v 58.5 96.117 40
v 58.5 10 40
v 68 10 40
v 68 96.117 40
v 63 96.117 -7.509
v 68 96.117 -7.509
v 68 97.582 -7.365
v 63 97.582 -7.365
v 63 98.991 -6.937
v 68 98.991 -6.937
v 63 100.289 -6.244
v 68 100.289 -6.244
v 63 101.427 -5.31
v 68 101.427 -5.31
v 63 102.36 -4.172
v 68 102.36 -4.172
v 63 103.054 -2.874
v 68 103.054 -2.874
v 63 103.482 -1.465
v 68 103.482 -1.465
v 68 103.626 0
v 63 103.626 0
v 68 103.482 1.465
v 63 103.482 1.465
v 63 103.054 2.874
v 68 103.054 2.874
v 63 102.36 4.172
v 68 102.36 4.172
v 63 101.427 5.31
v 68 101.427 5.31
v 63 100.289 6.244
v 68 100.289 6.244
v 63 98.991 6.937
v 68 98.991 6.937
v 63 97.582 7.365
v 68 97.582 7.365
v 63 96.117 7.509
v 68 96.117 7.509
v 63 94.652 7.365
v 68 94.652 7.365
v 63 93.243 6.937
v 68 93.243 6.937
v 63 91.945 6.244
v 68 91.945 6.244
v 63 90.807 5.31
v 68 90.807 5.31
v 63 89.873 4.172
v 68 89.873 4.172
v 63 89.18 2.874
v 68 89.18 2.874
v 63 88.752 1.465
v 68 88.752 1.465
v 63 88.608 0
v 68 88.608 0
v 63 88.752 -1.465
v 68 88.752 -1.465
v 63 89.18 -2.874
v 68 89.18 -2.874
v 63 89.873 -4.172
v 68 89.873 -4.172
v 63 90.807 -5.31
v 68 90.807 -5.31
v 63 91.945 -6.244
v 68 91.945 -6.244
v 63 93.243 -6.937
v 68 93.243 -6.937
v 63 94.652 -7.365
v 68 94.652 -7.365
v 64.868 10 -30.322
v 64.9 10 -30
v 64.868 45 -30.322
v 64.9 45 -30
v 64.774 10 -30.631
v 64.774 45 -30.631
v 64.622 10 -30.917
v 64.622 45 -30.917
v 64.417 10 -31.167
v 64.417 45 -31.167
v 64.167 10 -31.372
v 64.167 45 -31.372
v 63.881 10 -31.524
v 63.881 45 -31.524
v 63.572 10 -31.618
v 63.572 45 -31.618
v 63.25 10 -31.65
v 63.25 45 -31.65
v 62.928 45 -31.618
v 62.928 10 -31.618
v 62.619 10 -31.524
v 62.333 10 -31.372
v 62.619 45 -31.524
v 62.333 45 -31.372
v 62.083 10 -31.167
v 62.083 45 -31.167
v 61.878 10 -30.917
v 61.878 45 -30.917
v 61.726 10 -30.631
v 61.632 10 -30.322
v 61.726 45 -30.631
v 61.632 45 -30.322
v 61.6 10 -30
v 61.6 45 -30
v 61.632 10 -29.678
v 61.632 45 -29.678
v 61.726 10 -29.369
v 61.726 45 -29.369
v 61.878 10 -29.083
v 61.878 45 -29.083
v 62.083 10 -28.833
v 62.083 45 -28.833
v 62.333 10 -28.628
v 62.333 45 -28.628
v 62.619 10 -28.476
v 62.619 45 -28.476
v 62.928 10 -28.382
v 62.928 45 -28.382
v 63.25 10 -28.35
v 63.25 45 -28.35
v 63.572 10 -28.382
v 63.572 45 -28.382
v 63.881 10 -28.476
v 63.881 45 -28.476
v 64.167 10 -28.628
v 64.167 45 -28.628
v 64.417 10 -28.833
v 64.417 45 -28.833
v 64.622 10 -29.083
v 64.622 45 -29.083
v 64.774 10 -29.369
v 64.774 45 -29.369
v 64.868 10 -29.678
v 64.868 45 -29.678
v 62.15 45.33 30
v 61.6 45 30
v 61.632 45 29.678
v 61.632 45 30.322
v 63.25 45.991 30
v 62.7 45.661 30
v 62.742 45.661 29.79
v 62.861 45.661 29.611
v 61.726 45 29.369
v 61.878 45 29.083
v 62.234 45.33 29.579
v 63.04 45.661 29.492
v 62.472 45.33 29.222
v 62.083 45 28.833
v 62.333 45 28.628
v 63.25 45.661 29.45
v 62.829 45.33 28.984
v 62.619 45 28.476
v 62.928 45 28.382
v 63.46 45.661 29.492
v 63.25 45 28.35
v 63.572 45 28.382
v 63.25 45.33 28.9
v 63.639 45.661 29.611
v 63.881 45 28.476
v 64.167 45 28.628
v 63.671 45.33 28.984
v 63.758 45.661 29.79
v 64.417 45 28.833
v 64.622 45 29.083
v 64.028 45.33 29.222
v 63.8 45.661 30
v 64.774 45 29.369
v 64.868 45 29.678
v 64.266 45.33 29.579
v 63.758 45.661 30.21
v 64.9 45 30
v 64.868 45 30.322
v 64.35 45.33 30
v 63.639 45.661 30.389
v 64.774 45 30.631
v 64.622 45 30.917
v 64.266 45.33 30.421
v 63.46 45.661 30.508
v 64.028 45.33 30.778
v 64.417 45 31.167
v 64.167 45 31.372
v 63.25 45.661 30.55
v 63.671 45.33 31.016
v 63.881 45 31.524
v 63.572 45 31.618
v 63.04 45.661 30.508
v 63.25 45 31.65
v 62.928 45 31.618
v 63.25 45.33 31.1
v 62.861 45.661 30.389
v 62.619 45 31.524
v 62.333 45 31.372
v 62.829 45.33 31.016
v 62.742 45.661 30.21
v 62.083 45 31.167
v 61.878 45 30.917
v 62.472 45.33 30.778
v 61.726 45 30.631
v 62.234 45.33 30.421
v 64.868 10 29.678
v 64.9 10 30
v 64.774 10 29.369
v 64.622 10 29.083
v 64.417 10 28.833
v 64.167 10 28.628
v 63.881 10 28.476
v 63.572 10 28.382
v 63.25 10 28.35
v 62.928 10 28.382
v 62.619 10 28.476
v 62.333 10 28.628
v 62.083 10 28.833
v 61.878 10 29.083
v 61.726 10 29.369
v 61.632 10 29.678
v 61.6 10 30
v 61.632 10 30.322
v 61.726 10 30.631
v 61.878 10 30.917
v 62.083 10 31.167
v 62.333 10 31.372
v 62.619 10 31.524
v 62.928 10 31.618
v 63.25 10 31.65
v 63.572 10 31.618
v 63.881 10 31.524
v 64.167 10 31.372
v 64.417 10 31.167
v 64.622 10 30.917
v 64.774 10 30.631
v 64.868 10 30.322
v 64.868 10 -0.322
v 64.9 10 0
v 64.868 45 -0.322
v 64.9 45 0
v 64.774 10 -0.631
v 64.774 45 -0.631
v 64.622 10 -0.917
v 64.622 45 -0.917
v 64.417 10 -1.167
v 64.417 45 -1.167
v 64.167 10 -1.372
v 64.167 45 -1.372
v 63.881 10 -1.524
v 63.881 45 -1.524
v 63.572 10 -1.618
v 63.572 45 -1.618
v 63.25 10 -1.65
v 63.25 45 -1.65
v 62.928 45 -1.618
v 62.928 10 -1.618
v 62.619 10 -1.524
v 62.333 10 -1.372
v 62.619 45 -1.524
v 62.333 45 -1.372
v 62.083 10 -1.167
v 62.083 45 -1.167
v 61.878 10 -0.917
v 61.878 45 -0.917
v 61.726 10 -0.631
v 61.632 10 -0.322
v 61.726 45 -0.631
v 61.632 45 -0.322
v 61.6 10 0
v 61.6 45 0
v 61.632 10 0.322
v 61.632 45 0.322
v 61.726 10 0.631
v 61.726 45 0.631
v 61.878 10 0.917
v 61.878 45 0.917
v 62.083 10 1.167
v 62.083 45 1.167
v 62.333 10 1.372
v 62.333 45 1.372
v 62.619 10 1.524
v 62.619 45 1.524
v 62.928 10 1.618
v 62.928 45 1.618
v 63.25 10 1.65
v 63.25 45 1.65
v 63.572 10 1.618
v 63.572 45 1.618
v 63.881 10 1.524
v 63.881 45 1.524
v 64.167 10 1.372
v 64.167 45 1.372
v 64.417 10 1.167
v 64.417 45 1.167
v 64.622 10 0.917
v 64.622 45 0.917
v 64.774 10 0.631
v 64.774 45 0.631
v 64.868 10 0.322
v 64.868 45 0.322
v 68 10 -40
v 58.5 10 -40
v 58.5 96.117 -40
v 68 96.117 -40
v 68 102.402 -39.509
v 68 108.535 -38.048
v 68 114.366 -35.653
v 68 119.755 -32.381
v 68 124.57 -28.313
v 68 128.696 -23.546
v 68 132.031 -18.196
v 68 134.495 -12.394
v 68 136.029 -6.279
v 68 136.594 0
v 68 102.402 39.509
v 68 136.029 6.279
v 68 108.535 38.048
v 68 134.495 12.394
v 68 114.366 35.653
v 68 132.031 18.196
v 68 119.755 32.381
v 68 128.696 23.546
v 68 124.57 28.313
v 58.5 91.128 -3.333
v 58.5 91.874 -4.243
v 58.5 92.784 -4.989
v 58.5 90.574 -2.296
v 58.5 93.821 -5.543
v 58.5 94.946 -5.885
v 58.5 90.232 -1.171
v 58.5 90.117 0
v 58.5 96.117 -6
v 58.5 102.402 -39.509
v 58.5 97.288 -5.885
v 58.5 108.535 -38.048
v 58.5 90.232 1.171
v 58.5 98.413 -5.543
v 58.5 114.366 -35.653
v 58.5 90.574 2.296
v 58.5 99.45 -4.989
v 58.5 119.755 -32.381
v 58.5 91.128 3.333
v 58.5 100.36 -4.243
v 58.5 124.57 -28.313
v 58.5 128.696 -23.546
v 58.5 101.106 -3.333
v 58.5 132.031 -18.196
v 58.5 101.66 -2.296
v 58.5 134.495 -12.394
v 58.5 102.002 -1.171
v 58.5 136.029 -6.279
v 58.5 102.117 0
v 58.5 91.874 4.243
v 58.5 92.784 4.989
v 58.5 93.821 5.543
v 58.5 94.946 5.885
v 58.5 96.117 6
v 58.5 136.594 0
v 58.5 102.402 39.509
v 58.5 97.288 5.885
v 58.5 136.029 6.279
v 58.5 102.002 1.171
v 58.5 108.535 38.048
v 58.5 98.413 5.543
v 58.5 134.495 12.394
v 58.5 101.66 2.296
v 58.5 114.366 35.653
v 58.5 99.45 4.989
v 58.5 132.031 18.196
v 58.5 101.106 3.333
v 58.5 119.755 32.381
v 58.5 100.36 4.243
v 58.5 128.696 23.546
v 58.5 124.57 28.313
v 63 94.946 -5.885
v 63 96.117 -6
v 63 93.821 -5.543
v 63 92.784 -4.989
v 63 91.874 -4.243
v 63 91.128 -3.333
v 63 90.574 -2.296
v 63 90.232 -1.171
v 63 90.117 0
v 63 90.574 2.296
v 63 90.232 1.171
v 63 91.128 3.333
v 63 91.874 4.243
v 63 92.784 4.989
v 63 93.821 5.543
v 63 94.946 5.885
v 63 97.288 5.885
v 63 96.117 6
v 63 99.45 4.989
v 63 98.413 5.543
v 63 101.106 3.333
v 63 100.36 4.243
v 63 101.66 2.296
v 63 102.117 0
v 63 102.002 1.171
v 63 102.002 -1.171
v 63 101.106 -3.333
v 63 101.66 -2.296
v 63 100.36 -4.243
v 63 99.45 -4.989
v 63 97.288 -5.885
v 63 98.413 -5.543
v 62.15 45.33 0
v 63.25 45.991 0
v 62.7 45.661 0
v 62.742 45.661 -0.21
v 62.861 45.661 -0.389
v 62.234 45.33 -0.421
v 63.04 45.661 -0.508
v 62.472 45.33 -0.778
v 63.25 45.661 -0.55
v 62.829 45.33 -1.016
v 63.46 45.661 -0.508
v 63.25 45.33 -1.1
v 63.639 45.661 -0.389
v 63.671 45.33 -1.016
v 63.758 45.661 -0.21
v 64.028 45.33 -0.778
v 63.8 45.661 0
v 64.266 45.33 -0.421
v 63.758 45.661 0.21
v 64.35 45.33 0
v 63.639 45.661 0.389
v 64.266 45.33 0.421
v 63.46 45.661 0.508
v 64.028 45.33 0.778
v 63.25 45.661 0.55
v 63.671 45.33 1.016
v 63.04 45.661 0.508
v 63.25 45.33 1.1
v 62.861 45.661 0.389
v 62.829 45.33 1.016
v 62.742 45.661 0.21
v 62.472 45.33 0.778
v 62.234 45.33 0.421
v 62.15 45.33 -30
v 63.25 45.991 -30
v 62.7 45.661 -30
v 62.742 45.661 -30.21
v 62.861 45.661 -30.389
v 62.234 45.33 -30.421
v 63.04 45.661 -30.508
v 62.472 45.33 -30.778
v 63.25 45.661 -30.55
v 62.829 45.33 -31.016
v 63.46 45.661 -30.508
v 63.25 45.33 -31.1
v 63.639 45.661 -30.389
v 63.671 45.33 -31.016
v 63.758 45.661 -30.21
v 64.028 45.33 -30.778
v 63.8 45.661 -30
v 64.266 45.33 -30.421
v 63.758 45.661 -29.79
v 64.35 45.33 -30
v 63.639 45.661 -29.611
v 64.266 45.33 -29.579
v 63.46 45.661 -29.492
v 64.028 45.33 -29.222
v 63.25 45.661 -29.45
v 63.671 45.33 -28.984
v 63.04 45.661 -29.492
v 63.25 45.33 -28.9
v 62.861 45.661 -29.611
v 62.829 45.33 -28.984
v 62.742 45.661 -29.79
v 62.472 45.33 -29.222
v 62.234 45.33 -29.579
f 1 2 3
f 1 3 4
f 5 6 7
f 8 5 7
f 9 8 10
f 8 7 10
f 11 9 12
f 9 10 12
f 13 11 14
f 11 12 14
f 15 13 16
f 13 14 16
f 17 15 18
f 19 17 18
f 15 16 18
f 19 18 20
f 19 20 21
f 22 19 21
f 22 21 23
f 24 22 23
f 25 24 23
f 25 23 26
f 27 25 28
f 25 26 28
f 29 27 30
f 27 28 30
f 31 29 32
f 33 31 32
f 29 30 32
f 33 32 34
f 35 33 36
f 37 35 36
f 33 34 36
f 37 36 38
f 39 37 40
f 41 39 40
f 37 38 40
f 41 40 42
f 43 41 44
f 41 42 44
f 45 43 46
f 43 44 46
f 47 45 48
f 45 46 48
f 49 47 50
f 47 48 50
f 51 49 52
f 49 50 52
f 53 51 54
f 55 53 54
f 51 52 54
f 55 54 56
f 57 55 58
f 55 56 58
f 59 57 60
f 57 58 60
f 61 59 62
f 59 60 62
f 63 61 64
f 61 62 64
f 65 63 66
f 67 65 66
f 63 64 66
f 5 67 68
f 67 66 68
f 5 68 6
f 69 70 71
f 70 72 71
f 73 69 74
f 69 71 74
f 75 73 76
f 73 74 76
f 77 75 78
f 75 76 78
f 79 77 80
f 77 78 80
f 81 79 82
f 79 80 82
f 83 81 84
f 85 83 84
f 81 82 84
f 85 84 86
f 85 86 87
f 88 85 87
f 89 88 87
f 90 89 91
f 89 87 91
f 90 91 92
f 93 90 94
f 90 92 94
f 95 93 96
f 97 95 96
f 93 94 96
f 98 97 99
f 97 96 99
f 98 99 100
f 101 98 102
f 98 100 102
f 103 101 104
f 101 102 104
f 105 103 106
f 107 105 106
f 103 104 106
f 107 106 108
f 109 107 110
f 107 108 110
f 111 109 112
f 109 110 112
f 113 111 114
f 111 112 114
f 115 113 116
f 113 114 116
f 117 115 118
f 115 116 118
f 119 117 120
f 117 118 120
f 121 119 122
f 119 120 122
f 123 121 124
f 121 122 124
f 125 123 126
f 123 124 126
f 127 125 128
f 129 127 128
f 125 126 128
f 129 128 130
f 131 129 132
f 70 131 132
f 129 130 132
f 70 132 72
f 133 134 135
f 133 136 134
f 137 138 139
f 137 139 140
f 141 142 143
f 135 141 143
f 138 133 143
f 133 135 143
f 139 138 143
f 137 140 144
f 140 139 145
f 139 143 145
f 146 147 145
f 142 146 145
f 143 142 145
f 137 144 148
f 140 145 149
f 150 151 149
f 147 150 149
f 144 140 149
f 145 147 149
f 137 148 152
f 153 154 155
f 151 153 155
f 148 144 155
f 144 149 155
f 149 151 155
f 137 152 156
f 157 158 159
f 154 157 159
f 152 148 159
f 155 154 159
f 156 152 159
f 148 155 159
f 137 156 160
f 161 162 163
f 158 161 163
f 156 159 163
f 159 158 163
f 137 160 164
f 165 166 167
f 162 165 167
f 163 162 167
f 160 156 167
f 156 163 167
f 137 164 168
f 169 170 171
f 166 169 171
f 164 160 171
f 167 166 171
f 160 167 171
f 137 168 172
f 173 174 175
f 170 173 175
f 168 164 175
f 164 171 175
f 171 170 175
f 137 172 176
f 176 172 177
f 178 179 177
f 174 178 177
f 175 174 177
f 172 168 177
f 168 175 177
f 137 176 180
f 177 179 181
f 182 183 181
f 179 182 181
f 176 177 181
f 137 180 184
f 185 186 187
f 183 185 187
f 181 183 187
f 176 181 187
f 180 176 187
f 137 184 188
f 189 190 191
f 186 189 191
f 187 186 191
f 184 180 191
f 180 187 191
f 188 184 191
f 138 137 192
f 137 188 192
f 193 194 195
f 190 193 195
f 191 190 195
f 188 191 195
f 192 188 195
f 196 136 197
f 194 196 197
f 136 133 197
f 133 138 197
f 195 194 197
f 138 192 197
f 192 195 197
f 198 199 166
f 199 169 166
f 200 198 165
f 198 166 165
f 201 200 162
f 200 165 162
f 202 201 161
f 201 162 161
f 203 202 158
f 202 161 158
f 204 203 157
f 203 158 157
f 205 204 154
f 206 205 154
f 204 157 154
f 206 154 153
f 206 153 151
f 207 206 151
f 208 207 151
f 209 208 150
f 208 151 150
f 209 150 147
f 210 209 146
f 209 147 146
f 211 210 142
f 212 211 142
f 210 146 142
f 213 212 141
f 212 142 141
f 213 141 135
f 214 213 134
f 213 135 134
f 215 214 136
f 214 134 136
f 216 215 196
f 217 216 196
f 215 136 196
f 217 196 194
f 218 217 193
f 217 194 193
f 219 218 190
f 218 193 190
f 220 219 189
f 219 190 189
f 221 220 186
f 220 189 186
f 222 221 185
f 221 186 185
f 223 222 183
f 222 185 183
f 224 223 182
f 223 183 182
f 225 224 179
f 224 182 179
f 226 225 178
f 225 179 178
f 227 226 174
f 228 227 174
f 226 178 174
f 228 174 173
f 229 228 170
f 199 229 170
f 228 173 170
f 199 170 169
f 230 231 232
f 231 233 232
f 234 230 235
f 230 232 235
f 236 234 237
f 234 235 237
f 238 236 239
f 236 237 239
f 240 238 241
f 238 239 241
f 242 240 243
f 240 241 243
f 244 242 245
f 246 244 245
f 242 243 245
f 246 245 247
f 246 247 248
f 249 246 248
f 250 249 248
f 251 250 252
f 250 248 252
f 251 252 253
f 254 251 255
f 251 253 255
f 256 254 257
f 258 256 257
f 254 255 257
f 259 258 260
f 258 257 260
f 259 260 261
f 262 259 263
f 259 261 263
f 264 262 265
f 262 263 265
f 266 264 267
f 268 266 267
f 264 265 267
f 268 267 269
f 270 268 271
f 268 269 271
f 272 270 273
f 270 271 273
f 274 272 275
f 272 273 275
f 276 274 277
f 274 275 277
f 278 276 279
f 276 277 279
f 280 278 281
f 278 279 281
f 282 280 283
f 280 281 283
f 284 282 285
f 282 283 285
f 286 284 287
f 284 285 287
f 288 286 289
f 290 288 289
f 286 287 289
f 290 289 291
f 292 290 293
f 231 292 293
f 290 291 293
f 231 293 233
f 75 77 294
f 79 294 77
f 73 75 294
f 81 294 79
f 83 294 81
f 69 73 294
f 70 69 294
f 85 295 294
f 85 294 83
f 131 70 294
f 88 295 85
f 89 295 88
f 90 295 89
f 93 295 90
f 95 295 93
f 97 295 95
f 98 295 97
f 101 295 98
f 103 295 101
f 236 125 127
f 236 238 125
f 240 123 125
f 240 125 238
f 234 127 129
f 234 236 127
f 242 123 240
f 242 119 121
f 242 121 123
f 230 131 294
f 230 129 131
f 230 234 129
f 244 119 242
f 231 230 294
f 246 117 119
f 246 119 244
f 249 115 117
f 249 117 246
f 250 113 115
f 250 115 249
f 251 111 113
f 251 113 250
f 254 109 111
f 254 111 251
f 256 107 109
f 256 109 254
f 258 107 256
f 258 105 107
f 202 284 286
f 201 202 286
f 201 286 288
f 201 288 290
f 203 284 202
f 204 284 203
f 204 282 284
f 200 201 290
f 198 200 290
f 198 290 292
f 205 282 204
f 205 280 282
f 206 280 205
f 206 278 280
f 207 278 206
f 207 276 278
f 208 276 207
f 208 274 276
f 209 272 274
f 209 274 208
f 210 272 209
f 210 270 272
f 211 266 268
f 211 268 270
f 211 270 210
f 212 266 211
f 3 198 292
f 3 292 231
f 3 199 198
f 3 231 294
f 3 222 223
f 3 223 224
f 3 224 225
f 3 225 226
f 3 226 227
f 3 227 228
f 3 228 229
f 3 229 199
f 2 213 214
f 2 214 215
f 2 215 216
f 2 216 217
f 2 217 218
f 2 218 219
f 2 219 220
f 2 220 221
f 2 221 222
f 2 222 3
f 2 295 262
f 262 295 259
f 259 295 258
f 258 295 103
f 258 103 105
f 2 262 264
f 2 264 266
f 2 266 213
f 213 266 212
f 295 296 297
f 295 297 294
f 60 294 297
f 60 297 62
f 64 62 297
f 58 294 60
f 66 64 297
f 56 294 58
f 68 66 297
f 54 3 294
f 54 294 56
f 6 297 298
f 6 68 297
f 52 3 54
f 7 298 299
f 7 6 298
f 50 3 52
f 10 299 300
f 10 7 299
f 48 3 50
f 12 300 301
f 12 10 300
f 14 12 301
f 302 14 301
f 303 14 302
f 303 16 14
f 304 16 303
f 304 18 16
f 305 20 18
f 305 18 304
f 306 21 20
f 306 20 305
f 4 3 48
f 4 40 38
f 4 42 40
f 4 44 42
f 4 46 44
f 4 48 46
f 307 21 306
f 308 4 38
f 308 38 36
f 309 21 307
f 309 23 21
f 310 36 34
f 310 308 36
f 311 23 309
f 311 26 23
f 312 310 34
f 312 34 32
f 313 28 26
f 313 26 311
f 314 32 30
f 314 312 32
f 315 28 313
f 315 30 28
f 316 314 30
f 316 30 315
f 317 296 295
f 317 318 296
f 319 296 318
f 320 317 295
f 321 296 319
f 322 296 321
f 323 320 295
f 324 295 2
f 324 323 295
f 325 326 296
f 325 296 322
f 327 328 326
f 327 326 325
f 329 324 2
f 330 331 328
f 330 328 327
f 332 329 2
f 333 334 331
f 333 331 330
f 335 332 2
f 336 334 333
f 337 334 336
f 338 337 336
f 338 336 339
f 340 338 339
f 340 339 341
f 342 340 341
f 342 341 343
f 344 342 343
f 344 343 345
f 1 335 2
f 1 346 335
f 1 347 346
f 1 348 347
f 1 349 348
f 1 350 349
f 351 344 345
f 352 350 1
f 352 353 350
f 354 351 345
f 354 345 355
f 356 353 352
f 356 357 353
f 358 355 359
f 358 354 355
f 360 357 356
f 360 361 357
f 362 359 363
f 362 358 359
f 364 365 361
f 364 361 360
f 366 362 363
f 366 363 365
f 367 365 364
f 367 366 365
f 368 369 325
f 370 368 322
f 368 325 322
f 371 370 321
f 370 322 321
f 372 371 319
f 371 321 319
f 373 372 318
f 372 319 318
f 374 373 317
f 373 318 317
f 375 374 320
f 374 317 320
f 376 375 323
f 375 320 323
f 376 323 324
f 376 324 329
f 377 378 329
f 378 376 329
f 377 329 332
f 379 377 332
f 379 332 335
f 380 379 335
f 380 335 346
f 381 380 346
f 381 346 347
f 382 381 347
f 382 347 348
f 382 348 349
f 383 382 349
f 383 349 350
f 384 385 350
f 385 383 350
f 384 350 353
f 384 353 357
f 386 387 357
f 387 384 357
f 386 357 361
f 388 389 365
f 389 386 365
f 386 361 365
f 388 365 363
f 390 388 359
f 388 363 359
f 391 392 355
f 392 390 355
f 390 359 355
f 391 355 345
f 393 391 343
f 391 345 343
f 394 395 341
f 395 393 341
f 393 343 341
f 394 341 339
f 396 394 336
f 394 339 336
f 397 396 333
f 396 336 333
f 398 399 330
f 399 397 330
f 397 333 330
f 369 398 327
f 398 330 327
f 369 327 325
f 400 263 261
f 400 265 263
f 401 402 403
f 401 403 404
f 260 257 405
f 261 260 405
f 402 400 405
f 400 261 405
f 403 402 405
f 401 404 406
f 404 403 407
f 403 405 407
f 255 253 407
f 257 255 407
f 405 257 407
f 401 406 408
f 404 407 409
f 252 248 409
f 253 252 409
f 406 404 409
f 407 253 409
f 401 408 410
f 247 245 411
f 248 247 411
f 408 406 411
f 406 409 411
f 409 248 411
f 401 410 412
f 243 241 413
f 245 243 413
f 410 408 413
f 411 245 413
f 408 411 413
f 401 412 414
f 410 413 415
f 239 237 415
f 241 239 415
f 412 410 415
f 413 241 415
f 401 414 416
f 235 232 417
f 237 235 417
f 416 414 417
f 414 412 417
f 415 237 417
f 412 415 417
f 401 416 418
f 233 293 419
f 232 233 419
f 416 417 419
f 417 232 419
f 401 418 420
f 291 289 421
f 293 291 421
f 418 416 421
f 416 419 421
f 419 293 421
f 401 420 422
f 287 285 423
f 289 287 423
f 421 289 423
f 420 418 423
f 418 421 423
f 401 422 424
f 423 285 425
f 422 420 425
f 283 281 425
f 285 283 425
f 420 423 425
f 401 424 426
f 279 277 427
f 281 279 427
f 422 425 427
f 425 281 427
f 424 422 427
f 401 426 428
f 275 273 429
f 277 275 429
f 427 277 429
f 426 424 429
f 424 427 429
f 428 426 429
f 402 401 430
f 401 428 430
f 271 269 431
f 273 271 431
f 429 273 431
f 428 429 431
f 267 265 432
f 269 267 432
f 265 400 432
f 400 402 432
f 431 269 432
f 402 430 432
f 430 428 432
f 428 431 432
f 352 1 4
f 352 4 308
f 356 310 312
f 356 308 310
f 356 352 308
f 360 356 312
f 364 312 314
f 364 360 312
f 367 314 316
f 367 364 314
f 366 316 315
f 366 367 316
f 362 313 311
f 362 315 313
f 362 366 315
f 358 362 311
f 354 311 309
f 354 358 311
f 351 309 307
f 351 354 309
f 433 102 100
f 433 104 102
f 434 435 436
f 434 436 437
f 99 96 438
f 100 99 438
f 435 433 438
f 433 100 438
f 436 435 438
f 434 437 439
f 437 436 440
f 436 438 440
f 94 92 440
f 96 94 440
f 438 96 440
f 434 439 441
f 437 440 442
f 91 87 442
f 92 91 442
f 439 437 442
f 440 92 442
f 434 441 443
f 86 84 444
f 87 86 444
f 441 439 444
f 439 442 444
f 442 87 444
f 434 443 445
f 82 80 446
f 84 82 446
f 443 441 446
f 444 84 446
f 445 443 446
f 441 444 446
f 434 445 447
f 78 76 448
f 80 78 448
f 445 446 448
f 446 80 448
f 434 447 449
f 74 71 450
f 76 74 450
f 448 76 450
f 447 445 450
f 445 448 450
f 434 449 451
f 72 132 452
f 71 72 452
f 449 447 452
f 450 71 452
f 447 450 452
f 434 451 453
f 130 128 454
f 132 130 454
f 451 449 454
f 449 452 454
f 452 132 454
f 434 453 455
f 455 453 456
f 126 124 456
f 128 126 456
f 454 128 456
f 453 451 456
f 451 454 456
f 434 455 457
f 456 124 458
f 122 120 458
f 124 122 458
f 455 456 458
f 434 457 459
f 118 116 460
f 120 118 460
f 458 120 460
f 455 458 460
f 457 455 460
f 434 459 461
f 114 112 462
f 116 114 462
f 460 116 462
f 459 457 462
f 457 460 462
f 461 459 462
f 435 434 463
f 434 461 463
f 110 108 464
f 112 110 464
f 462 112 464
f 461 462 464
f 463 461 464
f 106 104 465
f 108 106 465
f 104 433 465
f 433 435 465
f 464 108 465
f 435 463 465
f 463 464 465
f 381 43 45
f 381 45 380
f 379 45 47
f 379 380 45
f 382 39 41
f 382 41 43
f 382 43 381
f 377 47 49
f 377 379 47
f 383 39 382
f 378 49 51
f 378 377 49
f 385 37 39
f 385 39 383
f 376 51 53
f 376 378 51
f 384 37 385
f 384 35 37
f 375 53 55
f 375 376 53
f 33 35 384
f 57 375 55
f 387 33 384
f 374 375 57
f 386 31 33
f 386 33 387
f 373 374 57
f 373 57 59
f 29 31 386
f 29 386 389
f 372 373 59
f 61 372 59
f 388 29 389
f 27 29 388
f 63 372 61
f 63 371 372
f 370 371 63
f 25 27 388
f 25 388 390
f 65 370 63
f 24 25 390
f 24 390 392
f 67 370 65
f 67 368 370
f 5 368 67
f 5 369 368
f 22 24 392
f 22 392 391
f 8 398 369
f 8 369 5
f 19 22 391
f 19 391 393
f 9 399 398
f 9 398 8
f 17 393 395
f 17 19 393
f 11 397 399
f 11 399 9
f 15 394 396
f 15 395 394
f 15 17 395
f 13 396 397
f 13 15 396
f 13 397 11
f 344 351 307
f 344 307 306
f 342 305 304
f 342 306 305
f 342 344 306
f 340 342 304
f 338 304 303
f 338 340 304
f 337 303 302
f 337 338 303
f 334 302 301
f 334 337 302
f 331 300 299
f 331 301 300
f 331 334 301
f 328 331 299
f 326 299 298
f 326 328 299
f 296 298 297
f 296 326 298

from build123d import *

# Parameters (mm, degrees)
STOCK_NEW_TRACKER_1_START = 60
STOCK_NEW_TRACKER_1_DEPTH = 8
SKETCH1_R                 = 7.509
CUT_EXTRUDE1_DEPTH        = 5
SKETCH2_R                 = 6
CUT_EXTRUDE2_DEPTH        = 143.418251296
BOSS_EXTRUDE1_START       = 1.5
SKETCH6_R                 = 6
BOSS_EXTRUDE1_DEPTH       = 1.5
M4X0_7_TAPPED_HOLE1_D     = 3.3
M4X0_7_TAPPED_HOLE1_DEPTH = 35
M4X0_7_TAPPED_HOLE1_TIP   = 0.991420021


# Read off the part's stored shape, not the designer's step: Stock-New_Tracker-1
with BuildPart() as part:
    # Stock-New_Tracker-1 outline → Stock-New_Tracker-1 (new body)
    with BuildSketch(Plane.YZ.offset(STOCK_NEW_TRACKER_1_START)):
        with BuildLine():
            Line((10, 40), (10, -40))
            Line((10, -40), (96.116983094, -40))
            ThreePointArc((96.116983094, -40), (124.570453884, -28.312888011), (136.594137144, 0))
            ThreePointArc((136.594137144, 0), (124.570453884, 28.312888011), (96.116983094, 40))
            Line((96.116983094, 40), (10, 40))
        make_face()
    extrude(amount=STOCK_NEW_TRACKER_1_DEPTH)

    # Sketch1 → Cut-Extrude1 (cut)
    with BuildSketch(Plane(origin=(68, 0, 0), x_dir=(0, 0, -1), z_dir=(1, 0, 0))):
        with Locations((0, 96.116983094)):
            Circle(SKETCH1_R)
    extrude(amount=-CUT_EXTRUDE1_DEPTH, mode=Mode.SUBTRACT)

    # Sketch2 → Cut-Extrude2 (cut, through all)
    with BuildSketch(Plane(origin=(63, 0, 0), x_dir=(0, 0, -1), z_dir=(1, 0, 0))):
        with Locations((0, 96.116983094)):
            Circle(SKETCH2_R)
    extrude(amount=-CUT_EXTRUDE2_DEPTH, mode=Mode.SUBTRACT)

    # Sketch6 → Boss-Extrude1 (add)
    with BuildSketch(Plane.ZY.offset(-60).offset(BOSS_EXTRUDE1_START)):
        with BuildLine():
            Line((-40, 96.116983094), (-40, 10))
            Line((-40, 10), (40, 10))
            Line((40, 10), (40, 96.116983094))
            ThreePointArc((40, 96.116983094), (28.312888011, 124.570453884), (0, 136.594137144))
            ThreePointArc((0, 136.594137144), (-28.312888011, 124.570453884), (-40, 96.116983094))
        make_face()
        with Locations(Location((0, 96.116983094, 0), (0, 0, 180))):
            Circle(SKETCH6_R, mode=Mode.SUBTRACT)
    extrude(amount=-BOSS_EXTRUDE1_DEPTH)

    # M4x0.7 Tapped Hole1
    with Locations(Plane(origin=(0, 10, 0), x_dir=(-1, 0, 0), z_dir=(0, -1, 0))):
        with Locations((-63.25, -30), (-63.25, 0), (-63.25, 30)):
            Hole(M4X0_7_TAPPED_HOLE1_D / 2, depth=M4X0_7_TAPPED_HOLE1_DEPTH)
            with Locations((0, 0, -(M4X0_7_TAPPED_HOLE1_DEPTH + M4X0_7_TAPPED_HOLE1_TIP / 2))):  # 118° drill point
                Cone(0, M4X0_7_TAPPED_HOLE1_D / 2, M4X0_7_TAPPED_HOLE1_TIP, mode=Mode.SUBTRACT)


solid = part.part
